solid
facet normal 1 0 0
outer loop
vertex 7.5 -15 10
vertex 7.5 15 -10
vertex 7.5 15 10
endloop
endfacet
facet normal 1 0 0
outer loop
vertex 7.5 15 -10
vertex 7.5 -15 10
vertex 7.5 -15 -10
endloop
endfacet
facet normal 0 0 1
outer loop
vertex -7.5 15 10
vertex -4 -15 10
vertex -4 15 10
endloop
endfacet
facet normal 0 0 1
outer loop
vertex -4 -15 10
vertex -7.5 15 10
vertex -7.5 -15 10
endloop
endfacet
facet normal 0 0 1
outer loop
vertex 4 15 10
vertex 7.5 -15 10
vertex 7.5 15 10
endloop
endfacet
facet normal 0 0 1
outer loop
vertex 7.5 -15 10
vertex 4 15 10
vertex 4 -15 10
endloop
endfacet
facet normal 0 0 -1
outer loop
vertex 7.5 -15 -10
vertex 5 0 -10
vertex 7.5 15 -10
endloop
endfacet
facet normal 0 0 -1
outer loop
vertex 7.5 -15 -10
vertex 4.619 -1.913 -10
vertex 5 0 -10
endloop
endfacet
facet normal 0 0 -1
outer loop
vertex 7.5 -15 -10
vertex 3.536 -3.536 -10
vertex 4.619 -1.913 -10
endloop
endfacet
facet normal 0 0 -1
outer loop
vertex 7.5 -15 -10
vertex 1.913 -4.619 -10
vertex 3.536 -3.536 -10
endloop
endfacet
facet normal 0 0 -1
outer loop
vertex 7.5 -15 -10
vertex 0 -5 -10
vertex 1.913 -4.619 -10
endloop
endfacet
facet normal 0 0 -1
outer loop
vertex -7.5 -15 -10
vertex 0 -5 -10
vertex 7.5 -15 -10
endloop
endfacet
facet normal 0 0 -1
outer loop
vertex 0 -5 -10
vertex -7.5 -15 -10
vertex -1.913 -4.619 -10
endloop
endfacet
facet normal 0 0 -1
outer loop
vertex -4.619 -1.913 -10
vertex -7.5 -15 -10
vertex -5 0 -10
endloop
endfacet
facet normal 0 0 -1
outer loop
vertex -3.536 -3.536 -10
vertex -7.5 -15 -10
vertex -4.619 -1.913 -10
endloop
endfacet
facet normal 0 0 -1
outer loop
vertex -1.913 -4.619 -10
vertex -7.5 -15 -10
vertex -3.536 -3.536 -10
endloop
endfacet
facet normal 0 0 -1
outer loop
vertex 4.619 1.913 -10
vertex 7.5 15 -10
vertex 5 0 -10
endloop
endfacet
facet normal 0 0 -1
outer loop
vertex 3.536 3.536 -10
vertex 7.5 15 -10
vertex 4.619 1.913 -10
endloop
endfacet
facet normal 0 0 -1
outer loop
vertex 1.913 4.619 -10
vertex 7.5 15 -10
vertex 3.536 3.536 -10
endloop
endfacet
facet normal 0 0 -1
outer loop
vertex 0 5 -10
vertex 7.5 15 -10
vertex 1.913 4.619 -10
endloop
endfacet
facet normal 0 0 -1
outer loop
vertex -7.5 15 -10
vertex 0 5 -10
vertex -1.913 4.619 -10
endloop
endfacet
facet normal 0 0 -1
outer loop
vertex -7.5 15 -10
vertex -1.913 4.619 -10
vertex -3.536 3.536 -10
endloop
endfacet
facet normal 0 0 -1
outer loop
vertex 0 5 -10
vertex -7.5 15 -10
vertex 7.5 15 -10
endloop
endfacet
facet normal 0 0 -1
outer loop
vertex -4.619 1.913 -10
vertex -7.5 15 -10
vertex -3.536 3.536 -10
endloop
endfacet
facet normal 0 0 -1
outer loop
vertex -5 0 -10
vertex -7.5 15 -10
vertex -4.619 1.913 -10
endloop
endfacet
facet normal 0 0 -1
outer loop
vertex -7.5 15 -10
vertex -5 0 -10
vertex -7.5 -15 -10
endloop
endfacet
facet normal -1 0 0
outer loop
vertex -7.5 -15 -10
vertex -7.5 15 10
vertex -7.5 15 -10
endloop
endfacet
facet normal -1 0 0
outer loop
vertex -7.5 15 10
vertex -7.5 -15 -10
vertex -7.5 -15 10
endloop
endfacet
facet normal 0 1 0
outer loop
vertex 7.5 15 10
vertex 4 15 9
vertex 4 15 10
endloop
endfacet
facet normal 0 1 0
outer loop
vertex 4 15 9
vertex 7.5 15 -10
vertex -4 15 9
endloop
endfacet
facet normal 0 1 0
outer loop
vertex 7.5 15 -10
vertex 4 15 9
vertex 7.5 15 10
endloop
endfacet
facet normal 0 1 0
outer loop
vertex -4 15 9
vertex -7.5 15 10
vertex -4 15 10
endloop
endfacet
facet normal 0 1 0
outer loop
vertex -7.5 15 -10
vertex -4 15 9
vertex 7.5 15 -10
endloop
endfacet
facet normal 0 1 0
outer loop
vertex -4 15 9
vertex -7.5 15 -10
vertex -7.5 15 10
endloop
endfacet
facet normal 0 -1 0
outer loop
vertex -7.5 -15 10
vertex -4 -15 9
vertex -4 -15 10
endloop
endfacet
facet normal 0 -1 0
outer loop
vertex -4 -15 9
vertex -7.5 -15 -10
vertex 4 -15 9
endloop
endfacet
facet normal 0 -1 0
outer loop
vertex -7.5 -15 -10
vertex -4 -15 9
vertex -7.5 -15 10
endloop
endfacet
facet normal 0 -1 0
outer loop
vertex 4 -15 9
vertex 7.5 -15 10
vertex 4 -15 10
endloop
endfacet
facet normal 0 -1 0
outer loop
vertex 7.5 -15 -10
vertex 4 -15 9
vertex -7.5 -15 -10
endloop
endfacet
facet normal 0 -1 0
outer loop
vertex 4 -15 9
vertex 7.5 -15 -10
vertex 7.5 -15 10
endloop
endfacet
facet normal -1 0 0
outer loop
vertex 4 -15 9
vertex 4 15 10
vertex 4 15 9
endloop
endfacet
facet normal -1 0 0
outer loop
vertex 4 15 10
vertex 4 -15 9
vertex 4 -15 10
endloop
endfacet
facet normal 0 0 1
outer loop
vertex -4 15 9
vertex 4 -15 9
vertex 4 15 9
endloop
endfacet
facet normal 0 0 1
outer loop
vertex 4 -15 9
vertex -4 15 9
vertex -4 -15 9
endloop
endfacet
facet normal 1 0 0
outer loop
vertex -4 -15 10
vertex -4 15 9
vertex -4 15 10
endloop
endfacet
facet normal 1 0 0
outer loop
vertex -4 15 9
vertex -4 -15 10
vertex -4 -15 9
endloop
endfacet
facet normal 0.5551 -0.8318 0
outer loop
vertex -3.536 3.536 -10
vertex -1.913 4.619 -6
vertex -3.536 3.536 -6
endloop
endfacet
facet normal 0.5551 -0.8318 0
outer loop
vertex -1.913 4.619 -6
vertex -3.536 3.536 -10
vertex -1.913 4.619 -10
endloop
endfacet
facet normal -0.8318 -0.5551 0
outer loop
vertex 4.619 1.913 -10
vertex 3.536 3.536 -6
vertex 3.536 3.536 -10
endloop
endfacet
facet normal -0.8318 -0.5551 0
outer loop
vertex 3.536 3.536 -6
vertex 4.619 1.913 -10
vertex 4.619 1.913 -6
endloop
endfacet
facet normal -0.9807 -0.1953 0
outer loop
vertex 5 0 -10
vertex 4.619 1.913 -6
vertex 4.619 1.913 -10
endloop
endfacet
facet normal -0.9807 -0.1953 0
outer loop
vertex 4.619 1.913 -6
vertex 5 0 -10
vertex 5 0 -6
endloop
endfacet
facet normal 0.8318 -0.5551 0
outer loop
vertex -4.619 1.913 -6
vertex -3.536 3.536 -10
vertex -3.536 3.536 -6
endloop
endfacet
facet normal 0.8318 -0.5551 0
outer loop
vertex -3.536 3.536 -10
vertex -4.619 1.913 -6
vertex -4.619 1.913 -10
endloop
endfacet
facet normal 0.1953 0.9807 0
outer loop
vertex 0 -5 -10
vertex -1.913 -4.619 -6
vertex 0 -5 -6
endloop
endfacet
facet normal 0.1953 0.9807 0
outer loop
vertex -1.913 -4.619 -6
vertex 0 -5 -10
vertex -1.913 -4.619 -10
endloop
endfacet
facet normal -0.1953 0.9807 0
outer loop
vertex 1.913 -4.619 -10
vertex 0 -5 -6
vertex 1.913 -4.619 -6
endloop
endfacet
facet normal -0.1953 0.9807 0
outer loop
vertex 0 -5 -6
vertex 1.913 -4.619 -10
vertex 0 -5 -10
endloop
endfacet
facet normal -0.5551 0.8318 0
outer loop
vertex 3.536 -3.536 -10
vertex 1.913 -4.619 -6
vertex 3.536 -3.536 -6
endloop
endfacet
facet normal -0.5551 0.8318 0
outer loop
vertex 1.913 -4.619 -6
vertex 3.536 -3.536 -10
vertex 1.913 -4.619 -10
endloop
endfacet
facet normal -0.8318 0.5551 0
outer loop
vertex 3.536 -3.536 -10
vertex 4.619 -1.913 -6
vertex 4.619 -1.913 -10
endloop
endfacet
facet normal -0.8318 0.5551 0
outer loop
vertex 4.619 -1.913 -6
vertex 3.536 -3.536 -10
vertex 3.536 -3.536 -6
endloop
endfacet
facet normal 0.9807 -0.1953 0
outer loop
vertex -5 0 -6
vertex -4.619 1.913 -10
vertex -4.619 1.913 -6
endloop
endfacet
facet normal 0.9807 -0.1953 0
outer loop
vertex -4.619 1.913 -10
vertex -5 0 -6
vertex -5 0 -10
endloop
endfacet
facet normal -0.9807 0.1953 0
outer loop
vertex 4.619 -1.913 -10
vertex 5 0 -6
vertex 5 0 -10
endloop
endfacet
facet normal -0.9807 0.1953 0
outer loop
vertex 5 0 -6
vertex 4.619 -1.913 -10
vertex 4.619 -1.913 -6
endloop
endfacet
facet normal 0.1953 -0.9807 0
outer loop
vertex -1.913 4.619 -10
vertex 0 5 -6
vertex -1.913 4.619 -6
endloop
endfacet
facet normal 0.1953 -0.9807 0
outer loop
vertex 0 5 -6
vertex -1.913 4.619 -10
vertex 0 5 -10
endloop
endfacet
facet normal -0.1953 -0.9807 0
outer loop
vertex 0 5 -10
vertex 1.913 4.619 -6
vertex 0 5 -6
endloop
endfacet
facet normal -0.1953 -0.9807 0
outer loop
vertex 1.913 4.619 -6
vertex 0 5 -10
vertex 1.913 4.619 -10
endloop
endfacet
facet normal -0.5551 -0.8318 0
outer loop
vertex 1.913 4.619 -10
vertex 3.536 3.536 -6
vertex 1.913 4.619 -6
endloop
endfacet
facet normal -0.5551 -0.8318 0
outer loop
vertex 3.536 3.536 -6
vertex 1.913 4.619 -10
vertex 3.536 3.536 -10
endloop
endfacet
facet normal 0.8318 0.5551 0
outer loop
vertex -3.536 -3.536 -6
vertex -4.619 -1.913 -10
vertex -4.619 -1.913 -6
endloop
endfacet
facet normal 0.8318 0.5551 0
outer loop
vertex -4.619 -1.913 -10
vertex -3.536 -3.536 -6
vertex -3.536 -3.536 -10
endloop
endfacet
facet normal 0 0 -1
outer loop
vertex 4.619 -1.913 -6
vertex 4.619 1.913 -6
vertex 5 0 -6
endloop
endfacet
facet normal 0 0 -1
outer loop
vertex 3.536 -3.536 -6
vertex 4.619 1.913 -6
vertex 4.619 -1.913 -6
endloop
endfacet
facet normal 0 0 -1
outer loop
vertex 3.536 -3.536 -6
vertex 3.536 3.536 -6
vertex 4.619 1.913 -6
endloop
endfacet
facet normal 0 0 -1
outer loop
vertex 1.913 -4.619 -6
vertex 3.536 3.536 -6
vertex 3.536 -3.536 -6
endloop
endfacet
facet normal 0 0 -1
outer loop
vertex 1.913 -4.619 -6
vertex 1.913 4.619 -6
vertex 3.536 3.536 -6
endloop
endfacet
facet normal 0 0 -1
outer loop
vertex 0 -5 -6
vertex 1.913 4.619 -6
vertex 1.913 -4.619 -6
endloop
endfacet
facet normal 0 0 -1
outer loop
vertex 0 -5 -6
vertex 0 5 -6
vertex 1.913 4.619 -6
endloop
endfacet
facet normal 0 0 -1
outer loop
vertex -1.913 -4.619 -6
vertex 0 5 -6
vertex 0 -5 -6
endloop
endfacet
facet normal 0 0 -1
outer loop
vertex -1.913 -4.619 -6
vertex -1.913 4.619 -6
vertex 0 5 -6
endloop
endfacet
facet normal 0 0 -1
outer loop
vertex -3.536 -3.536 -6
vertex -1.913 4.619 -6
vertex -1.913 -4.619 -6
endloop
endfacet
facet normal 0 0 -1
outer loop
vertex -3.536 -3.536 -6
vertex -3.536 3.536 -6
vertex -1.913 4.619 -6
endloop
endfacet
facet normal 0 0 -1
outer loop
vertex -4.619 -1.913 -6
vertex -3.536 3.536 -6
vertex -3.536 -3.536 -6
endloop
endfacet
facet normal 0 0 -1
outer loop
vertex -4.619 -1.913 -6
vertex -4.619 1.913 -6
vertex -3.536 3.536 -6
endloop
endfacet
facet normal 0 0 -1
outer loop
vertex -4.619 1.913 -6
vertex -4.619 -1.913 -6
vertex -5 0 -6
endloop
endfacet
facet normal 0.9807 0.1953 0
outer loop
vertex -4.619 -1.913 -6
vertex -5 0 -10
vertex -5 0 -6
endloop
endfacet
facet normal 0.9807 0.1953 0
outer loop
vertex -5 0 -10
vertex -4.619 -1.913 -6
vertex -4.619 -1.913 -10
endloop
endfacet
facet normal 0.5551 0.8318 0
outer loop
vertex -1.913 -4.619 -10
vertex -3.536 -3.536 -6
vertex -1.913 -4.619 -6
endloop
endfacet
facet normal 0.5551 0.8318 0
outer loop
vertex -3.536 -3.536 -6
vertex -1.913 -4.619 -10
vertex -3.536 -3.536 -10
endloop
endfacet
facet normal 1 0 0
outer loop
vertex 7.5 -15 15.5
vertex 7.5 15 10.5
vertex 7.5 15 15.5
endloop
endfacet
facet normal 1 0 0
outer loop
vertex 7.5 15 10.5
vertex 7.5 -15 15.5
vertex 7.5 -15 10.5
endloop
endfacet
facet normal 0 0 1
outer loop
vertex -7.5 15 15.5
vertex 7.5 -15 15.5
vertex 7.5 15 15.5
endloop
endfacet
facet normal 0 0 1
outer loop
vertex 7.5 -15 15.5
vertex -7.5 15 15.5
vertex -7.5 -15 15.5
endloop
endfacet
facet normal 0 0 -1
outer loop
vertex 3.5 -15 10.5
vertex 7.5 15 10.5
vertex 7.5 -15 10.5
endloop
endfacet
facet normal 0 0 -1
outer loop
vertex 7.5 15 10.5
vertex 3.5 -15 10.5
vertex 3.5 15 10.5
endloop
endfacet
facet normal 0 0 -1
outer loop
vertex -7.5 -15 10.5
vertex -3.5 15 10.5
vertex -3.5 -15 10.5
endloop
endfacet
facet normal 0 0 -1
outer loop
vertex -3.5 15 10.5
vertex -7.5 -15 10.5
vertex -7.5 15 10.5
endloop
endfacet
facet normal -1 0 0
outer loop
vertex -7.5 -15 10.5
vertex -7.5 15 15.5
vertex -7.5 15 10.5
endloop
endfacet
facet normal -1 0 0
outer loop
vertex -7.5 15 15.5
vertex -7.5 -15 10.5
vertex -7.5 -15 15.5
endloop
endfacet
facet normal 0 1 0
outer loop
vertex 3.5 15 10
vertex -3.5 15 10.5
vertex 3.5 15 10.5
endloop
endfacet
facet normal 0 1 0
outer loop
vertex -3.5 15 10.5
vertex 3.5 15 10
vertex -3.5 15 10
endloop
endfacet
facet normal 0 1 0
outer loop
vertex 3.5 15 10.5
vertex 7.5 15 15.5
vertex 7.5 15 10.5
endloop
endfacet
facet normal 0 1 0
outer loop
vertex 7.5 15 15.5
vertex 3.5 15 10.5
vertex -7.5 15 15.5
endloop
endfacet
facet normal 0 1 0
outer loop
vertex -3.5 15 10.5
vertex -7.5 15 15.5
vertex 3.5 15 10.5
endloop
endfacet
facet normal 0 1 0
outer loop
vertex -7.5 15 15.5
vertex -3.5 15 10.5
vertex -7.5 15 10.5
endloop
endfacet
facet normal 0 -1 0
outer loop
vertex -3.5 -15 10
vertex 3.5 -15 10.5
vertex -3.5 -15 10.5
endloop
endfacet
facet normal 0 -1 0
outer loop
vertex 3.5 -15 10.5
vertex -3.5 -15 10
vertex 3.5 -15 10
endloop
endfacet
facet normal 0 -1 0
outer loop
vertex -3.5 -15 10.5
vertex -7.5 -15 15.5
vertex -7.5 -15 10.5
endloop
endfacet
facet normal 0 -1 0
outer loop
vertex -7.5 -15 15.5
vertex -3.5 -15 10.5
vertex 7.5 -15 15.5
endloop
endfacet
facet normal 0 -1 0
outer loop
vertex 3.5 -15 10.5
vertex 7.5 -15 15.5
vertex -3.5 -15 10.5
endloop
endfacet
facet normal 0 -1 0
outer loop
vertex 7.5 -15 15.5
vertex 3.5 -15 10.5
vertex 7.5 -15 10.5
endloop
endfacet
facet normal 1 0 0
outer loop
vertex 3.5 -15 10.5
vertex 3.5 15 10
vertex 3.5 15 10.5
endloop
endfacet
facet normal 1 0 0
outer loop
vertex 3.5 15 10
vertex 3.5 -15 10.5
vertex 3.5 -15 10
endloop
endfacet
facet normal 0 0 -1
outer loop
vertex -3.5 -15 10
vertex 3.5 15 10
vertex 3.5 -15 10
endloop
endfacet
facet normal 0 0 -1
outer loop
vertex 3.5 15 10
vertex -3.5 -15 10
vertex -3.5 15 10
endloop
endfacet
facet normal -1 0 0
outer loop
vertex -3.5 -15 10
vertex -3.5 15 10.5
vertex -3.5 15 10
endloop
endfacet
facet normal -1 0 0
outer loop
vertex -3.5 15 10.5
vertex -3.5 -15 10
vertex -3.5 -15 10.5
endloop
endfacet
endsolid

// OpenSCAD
//Bottom Part

difference(){
    cube([15,30,20],true);

    translate([0,0,10])
        cube ([8,31,2],true);
    
    translate([0,0,-11])
        cylinder(h=5, r1=5, r2=5);
    }

//Top Part
union(){
    translate([0,0,13])
        cube([15,30,5],true);
    
     translate([0,0,11])
        cube ([7,30,2],true);
}
